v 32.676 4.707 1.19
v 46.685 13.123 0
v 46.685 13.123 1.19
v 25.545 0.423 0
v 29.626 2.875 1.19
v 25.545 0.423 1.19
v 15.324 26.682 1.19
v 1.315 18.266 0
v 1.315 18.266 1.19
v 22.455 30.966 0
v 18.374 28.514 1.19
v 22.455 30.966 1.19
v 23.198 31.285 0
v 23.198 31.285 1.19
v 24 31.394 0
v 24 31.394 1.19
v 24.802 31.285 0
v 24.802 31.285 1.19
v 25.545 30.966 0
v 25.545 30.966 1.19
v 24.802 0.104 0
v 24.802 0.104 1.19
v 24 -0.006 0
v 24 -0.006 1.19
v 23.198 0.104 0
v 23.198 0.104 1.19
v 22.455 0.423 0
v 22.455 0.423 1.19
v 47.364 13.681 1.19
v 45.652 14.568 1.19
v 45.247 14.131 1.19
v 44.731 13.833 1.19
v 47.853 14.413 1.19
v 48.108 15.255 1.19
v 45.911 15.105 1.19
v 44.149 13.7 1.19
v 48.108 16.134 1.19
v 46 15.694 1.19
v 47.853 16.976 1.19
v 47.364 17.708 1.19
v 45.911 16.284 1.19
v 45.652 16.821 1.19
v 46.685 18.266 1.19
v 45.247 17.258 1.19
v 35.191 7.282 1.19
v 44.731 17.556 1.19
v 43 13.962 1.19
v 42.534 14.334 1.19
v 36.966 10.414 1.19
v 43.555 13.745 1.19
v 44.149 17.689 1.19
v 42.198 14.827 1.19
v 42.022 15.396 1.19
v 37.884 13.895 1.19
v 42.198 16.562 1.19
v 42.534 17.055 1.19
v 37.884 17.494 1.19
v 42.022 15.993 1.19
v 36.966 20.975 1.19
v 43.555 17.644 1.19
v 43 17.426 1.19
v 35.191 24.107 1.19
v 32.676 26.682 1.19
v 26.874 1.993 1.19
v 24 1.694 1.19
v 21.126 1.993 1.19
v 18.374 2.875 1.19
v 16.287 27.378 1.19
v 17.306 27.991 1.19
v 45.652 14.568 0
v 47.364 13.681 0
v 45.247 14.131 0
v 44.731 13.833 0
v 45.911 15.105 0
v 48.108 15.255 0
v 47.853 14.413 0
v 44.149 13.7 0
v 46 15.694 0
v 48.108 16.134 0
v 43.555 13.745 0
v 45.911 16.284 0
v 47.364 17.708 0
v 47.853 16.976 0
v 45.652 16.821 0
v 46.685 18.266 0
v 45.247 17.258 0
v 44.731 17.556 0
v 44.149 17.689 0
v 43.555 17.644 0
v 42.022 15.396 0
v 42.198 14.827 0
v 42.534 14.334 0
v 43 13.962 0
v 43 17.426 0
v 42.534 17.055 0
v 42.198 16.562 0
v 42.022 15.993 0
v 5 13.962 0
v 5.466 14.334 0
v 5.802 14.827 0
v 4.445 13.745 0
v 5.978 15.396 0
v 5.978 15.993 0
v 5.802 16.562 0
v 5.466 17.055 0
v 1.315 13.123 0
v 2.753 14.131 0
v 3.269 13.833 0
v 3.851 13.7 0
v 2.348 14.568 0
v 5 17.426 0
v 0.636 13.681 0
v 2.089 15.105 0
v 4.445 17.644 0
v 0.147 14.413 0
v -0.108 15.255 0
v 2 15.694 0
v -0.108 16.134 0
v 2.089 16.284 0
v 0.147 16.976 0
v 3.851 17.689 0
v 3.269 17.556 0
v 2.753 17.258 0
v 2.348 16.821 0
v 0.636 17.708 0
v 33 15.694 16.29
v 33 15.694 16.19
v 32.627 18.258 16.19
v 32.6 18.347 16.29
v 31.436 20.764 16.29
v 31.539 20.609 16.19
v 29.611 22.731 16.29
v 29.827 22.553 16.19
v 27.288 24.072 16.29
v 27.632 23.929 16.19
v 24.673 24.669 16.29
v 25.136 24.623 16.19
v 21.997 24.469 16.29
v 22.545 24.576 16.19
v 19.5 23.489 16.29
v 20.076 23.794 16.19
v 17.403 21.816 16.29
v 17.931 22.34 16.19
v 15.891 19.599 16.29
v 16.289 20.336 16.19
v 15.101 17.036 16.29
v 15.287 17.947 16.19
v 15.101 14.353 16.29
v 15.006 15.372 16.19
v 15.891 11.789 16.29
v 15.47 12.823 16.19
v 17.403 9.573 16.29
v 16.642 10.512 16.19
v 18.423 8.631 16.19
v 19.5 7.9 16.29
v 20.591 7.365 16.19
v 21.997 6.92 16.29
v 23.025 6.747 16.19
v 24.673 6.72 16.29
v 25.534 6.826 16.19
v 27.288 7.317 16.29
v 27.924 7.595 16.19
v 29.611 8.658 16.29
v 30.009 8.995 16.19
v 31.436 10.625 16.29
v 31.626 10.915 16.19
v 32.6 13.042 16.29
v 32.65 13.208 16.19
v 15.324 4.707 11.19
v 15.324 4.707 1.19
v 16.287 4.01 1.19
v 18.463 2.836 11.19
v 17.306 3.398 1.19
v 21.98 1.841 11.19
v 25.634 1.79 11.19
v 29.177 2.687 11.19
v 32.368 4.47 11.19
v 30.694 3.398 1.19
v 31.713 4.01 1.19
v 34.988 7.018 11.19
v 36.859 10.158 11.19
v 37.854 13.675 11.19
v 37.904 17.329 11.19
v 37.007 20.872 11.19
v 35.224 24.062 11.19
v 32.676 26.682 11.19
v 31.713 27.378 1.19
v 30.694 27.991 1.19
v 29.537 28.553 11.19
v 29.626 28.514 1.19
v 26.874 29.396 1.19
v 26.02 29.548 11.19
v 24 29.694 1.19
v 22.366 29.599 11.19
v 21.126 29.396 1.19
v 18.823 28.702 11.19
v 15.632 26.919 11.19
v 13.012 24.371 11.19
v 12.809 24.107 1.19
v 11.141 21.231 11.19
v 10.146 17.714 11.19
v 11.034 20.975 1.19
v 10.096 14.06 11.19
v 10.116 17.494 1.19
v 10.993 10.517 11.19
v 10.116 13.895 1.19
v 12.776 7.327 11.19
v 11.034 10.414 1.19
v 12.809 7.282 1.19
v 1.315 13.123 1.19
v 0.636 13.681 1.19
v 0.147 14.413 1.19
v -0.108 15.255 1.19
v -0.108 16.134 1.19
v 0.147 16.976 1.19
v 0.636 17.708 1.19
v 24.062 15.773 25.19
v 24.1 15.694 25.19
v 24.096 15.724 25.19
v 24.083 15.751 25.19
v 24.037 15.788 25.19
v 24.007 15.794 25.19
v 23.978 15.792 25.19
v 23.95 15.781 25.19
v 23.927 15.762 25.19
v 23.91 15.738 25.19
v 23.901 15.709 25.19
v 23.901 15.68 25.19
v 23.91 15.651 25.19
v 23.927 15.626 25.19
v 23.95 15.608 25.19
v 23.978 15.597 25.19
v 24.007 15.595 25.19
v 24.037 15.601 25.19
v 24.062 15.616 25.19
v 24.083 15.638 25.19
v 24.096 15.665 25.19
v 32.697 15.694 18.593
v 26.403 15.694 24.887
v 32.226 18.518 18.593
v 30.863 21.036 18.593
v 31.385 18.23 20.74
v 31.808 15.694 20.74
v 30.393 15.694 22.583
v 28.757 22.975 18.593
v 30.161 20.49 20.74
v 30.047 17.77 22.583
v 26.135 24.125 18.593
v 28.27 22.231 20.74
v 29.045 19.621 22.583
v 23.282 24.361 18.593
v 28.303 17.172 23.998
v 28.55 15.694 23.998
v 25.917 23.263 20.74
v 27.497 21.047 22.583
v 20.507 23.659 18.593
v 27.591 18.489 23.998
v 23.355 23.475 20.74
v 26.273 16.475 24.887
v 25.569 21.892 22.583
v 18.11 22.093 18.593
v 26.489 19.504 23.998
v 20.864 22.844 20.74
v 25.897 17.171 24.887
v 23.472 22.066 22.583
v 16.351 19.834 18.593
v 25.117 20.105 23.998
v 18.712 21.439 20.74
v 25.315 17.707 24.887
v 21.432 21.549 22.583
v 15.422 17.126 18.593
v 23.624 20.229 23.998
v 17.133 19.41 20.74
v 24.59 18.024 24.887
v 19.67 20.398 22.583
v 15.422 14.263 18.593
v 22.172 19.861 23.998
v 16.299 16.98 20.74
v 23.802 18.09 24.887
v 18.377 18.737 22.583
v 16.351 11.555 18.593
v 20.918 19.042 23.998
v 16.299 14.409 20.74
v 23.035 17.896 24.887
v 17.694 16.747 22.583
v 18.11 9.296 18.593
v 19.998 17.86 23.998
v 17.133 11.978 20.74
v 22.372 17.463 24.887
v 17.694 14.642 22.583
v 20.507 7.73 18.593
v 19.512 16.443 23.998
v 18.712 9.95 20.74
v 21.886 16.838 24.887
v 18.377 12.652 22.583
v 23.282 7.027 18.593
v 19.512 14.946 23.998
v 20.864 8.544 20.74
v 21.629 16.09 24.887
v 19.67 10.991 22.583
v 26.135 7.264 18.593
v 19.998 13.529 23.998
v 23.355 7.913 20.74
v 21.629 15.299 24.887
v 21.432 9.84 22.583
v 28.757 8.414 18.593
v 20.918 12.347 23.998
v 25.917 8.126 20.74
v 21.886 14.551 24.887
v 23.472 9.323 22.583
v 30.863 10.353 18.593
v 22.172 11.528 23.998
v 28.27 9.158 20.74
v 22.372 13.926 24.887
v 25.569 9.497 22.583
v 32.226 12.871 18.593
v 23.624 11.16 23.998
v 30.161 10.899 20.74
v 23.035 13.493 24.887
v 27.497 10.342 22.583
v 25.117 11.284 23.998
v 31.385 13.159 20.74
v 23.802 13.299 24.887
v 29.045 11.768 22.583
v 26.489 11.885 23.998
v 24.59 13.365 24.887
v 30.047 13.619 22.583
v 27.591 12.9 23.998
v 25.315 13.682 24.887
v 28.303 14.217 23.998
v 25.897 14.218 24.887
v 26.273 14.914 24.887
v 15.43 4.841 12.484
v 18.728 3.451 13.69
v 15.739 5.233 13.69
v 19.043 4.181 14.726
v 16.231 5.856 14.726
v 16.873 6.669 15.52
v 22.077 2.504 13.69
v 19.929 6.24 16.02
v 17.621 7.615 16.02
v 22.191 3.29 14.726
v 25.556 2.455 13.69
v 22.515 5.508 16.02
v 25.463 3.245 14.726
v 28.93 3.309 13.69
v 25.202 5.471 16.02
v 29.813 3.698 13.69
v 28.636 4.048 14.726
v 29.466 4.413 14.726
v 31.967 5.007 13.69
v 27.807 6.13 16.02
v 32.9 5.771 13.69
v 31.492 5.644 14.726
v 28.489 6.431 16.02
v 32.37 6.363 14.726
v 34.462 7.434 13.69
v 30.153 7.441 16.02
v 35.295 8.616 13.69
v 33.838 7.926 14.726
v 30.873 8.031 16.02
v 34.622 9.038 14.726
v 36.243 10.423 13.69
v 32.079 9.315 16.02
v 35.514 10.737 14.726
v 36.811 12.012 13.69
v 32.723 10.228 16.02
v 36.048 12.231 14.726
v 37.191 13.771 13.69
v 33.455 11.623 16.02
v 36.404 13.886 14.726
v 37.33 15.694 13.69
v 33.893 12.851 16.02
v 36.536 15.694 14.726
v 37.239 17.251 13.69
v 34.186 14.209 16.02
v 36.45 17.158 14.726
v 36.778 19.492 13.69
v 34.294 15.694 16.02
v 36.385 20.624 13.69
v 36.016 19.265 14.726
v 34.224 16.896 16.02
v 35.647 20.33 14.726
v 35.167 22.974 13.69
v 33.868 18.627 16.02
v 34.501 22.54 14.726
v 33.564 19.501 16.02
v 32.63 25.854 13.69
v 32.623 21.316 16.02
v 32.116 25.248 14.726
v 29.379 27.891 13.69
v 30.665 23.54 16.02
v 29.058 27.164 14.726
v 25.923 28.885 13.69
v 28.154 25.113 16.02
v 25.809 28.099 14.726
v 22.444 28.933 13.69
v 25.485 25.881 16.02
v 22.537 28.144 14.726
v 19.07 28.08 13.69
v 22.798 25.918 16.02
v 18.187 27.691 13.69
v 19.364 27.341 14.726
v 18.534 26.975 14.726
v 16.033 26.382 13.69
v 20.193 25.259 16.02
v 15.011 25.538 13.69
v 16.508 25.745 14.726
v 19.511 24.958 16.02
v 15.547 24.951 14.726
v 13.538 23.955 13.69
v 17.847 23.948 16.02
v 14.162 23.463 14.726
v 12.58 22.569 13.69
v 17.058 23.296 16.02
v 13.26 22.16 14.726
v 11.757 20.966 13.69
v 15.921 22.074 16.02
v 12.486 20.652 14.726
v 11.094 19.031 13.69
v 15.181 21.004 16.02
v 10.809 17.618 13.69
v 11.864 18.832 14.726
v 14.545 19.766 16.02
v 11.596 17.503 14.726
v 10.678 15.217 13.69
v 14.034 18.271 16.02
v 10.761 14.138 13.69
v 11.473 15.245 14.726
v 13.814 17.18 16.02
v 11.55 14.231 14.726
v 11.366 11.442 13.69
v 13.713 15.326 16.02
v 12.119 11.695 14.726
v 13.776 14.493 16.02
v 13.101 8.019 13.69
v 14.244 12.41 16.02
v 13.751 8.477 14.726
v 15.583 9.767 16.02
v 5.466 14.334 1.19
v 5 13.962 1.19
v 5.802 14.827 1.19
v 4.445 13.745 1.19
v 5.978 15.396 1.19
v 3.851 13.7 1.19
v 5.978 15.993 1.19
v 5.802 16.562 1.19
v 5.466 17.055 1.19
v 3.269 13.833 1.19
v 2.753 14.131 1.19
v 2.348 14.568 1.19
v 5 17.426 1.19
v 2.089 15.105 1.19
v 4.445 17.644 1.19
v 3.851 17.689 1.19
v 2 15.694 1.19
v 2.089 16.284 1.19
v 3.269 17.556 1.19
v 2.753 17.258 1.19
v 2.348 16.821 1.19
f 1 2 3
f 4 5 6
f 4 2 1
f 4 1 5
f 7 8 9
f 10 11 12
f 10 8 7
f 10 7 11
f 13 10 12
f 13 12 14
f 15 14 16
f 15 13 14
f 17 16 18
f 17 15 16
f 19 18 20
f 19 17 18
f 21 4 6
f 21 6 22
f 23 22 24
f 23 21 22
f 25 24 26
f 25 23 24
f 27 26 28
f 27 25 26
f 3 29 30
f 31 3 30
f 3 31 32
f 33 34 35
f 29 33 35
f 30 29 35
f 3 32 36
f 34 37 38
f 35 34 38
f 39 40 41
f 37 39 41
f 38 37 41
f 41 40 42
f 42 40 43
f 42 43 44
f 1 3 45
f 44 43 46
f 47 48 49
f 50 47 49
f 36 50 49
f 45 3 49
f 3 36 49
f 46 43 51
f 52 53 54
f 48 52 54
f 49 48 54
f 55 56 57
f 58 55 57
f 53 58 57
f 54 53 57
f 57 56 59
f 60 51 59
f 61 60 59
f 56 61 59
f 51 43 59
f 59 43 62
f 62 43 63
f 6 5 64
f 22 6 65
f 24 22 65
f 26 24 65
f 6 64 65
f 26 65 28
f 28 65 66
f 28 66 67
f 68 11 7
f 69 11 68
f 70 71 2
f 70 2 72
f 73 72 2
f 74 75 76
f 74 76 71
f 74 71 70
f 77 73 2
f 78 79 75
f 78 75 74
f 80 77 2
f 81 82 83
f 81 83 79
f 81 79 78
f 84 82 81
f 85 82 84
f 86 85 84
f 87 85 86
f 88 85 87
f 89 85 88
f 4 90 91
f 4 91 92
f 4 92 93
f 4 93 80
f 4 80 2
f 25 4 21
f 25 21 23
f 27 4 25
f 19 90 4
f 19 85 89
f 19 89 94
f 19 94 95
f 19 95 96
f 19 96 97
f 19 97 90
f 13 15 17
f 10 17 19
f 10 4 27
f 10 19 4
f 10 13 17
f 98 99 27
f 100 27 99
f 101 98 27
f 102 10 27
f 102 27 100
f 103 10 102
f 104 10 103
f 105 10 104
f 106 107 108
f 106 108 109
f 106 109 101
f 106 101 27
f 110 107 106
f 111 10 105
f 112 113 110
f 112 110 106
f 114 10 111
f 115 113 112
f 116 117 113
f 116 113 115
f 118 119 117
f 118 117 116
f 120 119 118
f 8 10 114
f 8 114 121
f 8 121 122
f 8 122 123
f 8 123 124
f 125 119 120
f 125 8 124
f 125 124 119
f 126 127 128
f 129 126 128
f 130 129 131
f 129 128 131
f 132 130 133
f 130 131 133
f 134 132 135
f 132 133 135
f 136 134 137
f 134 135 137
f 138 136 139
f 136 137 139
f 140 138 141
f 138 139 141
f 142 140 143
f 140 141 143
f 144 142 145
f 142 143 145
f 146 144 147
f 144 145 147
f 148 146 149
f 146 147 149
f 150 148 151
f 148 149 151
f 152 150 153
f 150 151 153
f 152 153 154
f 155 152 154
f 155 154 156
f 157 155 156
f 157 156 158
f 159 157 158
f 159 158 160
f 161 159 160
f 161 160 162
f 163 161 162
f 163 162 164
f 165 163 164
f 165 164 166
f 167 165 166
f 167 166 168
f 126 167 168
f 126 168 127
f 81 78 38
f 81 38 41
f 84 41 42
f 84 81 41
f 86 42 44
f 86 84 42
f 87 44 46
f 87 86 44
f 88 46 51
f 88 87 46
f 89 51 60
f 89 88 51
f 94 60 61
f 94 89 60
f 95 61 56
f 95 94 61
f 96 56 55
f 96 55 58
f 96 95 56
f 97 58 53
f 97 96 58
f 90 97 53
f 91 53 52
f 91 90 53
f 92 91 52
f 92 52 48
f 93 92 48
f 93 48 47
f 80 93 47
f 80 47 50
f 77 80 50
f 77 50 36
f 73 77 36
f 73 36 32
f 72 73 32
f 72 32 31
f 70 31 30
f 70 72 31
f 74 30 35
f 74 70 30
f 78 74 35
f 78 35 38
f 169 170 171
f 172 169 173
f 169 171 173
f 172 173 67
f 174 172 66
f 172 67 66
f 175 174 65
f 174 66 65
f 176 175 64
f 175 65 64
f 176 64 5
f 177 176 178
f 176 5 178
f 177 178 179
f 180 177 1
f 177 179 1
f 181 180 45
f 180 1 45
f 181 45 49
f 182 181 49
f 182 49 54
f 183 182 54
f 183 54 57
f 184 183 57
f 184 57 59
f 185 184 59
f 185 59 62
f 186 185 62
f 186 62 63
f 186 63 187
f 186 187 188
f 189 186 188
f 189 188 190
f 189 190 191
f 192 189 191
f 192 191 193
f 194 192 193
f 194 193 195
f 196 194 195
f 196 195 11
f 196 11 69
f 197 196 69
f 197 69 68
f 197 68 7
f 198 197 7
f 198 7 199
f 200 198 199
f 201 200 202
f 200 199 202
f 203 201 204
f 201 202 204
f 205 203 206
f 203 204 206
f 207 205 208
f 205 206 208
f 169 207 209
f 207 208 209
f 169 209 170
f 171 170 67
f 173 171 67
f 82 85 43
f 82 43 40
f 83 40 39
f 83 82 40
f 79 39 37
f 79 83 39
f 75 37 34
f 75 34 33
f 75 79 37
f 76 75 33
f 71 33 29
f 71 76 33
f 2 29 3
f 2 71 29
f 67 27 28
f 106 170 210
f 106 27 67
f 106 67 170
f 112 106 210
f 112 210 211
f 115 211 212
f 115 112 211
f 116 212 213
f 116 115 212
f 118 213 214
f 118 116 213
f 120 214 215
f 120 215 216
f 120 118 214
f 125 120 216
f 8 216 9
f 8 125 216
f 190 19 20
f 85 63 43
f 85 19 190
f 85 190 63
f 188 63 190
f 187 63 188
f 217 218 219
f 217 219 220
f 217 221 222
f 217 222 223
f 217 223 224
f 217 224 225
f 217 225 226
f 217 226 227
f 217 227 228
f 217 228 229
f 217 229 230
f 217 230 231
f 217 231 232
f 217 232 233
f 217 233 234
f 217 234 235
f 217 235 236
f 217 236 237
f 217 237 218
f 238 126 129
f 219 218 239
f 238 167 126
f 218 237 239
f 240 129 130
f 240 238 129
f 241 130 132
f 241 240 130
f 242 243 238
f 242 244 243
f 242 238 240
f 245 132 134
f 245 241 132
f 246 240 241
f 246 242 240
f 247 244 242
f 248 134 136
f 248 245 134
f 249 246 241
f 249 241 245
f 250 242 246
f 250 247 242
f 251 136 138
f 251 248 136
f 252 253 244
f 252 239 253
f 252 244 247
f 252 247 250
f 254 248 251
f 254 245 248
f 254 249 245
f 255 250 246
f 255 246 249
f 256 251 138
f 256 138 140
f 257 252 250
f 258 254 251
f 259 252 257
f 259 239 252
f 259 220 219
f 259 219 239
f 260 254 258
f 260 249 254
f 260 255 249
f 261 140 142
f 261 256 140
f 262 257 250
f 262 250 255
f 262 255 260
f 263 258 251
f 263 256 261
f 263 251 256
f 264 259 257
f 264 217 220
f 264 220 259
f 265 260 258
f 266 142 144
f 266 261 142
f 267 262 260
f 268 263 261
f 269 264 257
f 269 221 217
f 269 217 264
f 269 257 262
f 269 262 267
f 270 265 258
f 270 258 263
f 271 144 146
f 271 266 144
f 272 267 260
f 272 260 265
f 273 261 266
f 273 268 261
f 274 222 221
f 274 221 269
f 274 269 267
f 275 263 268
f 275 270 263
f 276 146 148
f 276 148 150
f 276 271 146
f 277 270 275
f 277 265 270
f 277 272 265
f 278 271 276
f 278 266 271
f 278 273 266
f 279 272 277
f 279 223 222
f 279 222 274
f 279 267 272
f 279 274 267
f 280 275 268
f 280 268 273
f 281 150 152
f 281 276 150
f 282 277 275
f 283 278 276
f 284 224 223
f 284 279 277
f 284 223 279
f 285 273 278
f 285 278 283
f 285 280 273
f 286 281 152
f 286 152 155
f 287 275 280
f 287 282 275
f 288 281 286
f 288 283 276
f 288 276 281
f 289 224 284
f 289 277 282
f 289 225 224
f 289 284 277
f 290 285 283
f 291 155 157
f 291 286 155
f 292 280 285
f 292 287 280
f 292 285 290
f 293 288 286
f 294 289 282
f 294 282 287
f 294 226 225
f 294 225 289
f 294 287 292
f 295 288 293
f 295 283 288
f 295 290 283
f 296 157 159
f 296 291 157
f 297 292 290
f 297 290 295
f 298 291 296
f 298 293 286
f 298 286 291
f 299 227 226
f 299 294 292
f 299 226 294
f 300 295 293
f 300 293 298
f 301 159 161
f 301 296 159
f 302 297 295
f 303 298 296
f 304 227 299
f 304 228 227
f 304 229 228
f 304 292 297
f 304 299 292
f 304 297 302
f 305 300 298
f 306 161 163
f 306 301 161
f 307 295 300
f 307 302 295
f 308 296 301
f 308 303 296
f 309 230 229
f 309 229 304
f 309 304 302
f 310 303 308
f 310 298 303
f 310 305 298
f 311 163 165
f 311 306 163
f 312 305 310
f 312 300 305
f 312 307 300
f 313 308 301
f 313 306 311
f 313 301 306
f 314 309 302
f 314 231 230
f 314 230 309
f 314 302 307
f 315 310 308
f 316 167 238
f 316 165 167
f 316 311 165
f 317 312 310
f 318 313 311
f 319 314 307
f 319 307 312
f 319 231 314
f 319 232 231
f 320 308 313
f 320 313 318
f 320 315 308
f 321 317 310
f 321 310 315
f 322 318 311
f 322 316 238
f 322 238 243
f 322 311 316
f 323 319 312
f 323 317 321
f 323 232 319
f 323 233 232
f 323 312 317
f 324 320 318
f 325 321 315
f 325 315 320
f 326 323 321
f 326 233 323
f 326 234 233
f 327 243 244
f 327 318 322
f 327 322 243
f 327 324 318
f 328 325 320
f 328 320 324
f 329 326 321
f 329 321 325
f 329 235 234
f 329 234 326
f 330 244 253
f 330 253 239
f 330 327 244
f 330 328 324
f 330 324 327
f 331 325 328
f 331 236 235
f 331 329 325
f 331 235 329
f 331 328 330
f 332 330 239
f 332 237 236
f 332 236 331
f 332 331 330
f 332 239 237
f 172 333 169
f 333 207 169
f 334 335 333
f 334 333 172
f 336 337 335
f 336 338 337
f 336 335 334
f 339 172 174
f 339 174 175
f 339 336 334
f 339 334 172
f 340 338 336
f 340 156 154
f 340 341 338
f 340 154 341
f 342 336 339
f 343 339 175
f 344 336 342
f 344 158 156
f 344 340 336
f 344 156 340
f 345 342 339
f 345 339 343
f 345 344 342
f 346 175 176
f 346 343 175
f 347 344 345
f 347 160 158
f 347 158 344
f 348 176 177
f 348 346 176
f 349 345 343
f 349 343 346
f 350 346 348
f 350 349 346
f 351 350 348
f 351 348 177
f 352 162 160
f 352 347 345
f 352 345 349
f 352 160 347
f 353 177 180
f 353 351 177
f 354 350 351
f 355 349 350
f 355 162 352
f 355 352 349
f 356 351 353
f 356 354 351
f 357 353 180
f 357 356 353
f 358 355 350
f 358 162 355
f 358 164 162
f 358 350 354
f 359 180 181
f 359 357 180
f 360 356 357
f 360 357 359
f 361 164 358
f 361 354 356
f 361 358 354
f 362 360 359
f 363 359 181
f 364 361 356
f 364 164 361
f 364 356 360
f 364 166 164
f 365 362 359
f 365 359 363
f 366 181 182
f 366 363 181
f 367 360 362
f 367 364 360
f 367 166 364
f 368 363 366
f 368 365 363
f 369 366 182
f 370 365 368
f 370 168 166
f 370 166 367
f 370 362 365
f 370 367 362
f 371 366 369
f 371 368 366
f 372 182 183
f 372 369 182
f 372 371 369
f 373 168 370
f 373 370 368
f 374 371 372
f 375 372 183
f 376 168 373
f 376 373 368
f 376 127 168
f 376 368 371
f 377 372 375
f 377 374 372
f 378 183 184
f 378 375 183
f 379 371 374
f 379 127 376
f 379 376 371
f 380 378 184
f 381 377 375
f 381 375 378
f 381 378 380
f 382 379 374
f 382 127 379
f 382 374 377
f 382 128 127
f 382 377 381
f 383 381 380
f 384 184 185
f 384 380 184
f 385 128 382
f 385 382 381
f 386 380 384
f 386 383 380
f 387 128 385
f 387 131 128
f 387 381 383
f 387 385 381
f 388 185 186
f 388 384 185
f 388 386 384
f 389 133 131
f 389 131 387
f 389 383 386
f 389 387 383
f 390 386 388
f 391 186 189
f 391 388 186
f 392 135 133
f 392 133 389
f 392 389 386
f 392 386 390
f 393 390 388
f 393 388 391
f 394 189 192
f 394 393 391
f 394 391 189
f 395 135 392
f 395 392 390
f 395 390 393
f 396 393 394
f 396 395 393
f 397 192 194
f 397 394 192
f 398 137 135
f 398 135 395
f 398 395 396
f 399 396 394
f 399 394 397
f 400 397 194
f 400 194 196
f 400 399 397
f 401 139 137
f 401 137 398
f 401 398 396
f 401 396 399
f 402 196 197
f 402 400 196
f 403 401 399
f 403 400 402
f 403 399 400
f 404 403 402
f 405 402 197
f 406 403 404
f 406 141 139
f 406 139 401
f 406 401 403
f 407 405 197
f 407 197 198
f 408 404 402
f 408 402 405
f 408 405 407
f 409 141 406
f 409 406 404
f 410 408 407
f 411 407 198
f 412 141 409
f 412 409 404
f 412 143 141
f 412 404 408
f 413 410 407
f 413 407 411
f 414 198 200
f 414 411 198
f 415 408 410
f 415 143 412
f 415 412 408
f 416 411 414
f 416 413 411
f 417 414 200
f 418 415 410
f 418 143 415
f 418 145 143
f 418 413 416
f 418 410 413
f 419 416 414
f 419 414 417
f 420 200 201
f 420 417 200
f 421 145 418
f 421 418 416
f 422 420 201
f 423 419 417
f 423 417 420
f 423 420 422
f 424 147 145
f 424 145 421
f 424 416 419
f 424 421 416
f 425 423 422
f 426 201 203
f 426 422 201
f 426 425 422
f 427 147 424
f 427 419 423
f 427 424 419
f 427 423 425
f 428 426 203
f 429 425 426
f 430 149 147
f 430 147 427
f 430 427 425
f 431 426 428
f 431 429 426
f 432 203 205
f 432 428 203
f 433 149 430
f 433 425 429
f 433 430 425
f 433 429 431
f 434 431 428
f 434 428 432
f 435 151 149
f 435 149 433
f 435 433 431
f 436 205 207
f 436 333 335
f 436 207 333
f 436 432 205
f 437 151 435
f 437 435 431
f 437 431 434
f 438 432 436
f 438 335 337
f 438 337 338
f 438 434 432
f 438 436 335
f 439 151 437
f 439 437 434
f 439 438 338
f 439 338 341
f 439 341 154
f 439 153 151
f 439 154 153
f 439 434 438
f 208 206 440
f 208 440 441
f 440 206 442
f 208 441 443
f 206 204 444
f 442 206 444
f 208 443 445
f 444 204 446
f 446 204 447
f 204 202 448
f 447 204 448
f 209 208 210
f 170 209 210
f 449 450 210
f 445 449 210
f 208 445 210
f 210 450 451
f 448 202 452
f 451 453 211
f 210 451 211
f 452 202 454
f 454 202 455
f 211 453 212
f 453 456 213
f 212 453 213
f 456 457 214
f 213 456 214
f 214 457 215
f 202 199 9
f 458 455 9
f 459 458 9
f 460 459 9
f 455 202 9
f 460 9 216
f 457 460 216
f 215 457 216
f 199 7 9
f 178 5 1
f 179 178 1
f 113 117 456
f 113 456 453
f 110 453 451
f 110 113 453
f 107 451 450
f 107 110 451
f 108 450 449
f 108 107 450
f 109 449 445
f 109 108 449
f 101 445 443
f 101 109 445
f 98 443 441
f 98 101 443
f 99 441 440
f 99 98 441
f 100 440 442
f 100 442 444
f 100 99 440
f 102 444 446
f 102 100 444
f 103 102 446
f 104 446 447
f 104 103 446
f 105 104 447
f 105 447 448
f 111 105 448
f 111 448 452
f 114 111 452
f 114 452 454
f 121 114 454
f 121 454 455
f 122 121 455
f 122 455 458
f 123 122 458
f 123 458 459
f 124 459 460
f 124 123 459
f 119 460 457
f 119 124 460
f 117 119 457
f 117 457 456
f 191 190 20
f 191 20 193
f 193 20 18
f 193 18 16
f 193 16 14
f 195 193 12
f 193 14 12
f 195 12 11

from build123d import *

# Parameters (mm, degrees)
ESQUISSE1_R        = 2
BOSS_EXTRU_1_DEPTH = 1.19
ESQUISSE2_R        = 14
BOSS_EXTRU_2_DEPTH = 15
CONG_1_R           = 5
ESQUISSE3_R        = 9
BOSS_EXTRU_3_DEPTH = 9
CONG_2_R           = 8.9


with BuildPart() as part:
    # Esquisse1 → Boss.-Extru.1 (new body)
    with BuildSketch(Plane.XY):
        with BuildLine():
            Line((1.31508183, 18.266068418), (22.45508183, 30.966068418))
            ThreePointArc((22.45508183, 30.966068418), (24, 31.394448725), (25.54491817, 30.966068418))
            Line((25.54491817, 30.966068418), (46.68491817, 18.266068418))
            ThreePointArc((46.68491817, 18.266068418), (48.14, 15.694448725), (46.68491817, 13.122829031))
            Line((46.68491817, 13.122829031), (25.54491817, 0.422829031))
            ThreePointArc((25.54491817, 0.422829031), (24, -0.005551275), (22.45508183, 0.422829031))
            Line((22.45508183, 0.422829031), (1.31508183, 13.122829031))
            ThreePointArc((1.31508183, 13.122829031), (-0.14, 15.694448725), (1.31508183, 18.266068418))
        make_face()
        with Locations((44, 15.694448725)):
            Circle(ESQUISSE1_R, mode=Mode.SUBTRACT)
        with Locations(Location((4, 15.694448725, 0), (0, 0, 180))):
            Circle(ESQUISSE1_R, mode=Mode.SUBTRACT)
    extrude(amount=BOSS_EXTRU_1_DEPTH)

    # Esquisse2 → Boss.-Extru.2 (add)
    with BuildSketch(Plane.XY.offset(1.19)):
        with Locations(Location((24, 15.694448725, 0), (0, 0, 231.704406007))):
            Circle(ESQUISSE2_R)
    extrude(amount=BOSS_EXTRU_2_DEPTH)

    # Congé1
    cong_1_edges = [part.edges().sort_by_distance(p)[0] for p in [
        (32.676061537, 26.681985128, 16.19),
    ]]
    fillet(cong_1_edges, radius=CONG_1_R)

    # Esquisse3 → Boss.-Extru.3 (add)
    with BuildSketch(Plane.XY.offset(16.19)):
        with Locations((24, 15.694448725)):
            Circle(ESQUISSE3_R)
    extrude(amount=BOSS_EXTRU_3_DEPTH)

    # Congé2
    cong_2_edges = [part.edges().sort_by_distance(p)[0] for p in [
        (15, 15.694448725, 25.19),
    ]]
    fillet(cong_2_edges, radius=CONG_2_R)


solid = part.part
